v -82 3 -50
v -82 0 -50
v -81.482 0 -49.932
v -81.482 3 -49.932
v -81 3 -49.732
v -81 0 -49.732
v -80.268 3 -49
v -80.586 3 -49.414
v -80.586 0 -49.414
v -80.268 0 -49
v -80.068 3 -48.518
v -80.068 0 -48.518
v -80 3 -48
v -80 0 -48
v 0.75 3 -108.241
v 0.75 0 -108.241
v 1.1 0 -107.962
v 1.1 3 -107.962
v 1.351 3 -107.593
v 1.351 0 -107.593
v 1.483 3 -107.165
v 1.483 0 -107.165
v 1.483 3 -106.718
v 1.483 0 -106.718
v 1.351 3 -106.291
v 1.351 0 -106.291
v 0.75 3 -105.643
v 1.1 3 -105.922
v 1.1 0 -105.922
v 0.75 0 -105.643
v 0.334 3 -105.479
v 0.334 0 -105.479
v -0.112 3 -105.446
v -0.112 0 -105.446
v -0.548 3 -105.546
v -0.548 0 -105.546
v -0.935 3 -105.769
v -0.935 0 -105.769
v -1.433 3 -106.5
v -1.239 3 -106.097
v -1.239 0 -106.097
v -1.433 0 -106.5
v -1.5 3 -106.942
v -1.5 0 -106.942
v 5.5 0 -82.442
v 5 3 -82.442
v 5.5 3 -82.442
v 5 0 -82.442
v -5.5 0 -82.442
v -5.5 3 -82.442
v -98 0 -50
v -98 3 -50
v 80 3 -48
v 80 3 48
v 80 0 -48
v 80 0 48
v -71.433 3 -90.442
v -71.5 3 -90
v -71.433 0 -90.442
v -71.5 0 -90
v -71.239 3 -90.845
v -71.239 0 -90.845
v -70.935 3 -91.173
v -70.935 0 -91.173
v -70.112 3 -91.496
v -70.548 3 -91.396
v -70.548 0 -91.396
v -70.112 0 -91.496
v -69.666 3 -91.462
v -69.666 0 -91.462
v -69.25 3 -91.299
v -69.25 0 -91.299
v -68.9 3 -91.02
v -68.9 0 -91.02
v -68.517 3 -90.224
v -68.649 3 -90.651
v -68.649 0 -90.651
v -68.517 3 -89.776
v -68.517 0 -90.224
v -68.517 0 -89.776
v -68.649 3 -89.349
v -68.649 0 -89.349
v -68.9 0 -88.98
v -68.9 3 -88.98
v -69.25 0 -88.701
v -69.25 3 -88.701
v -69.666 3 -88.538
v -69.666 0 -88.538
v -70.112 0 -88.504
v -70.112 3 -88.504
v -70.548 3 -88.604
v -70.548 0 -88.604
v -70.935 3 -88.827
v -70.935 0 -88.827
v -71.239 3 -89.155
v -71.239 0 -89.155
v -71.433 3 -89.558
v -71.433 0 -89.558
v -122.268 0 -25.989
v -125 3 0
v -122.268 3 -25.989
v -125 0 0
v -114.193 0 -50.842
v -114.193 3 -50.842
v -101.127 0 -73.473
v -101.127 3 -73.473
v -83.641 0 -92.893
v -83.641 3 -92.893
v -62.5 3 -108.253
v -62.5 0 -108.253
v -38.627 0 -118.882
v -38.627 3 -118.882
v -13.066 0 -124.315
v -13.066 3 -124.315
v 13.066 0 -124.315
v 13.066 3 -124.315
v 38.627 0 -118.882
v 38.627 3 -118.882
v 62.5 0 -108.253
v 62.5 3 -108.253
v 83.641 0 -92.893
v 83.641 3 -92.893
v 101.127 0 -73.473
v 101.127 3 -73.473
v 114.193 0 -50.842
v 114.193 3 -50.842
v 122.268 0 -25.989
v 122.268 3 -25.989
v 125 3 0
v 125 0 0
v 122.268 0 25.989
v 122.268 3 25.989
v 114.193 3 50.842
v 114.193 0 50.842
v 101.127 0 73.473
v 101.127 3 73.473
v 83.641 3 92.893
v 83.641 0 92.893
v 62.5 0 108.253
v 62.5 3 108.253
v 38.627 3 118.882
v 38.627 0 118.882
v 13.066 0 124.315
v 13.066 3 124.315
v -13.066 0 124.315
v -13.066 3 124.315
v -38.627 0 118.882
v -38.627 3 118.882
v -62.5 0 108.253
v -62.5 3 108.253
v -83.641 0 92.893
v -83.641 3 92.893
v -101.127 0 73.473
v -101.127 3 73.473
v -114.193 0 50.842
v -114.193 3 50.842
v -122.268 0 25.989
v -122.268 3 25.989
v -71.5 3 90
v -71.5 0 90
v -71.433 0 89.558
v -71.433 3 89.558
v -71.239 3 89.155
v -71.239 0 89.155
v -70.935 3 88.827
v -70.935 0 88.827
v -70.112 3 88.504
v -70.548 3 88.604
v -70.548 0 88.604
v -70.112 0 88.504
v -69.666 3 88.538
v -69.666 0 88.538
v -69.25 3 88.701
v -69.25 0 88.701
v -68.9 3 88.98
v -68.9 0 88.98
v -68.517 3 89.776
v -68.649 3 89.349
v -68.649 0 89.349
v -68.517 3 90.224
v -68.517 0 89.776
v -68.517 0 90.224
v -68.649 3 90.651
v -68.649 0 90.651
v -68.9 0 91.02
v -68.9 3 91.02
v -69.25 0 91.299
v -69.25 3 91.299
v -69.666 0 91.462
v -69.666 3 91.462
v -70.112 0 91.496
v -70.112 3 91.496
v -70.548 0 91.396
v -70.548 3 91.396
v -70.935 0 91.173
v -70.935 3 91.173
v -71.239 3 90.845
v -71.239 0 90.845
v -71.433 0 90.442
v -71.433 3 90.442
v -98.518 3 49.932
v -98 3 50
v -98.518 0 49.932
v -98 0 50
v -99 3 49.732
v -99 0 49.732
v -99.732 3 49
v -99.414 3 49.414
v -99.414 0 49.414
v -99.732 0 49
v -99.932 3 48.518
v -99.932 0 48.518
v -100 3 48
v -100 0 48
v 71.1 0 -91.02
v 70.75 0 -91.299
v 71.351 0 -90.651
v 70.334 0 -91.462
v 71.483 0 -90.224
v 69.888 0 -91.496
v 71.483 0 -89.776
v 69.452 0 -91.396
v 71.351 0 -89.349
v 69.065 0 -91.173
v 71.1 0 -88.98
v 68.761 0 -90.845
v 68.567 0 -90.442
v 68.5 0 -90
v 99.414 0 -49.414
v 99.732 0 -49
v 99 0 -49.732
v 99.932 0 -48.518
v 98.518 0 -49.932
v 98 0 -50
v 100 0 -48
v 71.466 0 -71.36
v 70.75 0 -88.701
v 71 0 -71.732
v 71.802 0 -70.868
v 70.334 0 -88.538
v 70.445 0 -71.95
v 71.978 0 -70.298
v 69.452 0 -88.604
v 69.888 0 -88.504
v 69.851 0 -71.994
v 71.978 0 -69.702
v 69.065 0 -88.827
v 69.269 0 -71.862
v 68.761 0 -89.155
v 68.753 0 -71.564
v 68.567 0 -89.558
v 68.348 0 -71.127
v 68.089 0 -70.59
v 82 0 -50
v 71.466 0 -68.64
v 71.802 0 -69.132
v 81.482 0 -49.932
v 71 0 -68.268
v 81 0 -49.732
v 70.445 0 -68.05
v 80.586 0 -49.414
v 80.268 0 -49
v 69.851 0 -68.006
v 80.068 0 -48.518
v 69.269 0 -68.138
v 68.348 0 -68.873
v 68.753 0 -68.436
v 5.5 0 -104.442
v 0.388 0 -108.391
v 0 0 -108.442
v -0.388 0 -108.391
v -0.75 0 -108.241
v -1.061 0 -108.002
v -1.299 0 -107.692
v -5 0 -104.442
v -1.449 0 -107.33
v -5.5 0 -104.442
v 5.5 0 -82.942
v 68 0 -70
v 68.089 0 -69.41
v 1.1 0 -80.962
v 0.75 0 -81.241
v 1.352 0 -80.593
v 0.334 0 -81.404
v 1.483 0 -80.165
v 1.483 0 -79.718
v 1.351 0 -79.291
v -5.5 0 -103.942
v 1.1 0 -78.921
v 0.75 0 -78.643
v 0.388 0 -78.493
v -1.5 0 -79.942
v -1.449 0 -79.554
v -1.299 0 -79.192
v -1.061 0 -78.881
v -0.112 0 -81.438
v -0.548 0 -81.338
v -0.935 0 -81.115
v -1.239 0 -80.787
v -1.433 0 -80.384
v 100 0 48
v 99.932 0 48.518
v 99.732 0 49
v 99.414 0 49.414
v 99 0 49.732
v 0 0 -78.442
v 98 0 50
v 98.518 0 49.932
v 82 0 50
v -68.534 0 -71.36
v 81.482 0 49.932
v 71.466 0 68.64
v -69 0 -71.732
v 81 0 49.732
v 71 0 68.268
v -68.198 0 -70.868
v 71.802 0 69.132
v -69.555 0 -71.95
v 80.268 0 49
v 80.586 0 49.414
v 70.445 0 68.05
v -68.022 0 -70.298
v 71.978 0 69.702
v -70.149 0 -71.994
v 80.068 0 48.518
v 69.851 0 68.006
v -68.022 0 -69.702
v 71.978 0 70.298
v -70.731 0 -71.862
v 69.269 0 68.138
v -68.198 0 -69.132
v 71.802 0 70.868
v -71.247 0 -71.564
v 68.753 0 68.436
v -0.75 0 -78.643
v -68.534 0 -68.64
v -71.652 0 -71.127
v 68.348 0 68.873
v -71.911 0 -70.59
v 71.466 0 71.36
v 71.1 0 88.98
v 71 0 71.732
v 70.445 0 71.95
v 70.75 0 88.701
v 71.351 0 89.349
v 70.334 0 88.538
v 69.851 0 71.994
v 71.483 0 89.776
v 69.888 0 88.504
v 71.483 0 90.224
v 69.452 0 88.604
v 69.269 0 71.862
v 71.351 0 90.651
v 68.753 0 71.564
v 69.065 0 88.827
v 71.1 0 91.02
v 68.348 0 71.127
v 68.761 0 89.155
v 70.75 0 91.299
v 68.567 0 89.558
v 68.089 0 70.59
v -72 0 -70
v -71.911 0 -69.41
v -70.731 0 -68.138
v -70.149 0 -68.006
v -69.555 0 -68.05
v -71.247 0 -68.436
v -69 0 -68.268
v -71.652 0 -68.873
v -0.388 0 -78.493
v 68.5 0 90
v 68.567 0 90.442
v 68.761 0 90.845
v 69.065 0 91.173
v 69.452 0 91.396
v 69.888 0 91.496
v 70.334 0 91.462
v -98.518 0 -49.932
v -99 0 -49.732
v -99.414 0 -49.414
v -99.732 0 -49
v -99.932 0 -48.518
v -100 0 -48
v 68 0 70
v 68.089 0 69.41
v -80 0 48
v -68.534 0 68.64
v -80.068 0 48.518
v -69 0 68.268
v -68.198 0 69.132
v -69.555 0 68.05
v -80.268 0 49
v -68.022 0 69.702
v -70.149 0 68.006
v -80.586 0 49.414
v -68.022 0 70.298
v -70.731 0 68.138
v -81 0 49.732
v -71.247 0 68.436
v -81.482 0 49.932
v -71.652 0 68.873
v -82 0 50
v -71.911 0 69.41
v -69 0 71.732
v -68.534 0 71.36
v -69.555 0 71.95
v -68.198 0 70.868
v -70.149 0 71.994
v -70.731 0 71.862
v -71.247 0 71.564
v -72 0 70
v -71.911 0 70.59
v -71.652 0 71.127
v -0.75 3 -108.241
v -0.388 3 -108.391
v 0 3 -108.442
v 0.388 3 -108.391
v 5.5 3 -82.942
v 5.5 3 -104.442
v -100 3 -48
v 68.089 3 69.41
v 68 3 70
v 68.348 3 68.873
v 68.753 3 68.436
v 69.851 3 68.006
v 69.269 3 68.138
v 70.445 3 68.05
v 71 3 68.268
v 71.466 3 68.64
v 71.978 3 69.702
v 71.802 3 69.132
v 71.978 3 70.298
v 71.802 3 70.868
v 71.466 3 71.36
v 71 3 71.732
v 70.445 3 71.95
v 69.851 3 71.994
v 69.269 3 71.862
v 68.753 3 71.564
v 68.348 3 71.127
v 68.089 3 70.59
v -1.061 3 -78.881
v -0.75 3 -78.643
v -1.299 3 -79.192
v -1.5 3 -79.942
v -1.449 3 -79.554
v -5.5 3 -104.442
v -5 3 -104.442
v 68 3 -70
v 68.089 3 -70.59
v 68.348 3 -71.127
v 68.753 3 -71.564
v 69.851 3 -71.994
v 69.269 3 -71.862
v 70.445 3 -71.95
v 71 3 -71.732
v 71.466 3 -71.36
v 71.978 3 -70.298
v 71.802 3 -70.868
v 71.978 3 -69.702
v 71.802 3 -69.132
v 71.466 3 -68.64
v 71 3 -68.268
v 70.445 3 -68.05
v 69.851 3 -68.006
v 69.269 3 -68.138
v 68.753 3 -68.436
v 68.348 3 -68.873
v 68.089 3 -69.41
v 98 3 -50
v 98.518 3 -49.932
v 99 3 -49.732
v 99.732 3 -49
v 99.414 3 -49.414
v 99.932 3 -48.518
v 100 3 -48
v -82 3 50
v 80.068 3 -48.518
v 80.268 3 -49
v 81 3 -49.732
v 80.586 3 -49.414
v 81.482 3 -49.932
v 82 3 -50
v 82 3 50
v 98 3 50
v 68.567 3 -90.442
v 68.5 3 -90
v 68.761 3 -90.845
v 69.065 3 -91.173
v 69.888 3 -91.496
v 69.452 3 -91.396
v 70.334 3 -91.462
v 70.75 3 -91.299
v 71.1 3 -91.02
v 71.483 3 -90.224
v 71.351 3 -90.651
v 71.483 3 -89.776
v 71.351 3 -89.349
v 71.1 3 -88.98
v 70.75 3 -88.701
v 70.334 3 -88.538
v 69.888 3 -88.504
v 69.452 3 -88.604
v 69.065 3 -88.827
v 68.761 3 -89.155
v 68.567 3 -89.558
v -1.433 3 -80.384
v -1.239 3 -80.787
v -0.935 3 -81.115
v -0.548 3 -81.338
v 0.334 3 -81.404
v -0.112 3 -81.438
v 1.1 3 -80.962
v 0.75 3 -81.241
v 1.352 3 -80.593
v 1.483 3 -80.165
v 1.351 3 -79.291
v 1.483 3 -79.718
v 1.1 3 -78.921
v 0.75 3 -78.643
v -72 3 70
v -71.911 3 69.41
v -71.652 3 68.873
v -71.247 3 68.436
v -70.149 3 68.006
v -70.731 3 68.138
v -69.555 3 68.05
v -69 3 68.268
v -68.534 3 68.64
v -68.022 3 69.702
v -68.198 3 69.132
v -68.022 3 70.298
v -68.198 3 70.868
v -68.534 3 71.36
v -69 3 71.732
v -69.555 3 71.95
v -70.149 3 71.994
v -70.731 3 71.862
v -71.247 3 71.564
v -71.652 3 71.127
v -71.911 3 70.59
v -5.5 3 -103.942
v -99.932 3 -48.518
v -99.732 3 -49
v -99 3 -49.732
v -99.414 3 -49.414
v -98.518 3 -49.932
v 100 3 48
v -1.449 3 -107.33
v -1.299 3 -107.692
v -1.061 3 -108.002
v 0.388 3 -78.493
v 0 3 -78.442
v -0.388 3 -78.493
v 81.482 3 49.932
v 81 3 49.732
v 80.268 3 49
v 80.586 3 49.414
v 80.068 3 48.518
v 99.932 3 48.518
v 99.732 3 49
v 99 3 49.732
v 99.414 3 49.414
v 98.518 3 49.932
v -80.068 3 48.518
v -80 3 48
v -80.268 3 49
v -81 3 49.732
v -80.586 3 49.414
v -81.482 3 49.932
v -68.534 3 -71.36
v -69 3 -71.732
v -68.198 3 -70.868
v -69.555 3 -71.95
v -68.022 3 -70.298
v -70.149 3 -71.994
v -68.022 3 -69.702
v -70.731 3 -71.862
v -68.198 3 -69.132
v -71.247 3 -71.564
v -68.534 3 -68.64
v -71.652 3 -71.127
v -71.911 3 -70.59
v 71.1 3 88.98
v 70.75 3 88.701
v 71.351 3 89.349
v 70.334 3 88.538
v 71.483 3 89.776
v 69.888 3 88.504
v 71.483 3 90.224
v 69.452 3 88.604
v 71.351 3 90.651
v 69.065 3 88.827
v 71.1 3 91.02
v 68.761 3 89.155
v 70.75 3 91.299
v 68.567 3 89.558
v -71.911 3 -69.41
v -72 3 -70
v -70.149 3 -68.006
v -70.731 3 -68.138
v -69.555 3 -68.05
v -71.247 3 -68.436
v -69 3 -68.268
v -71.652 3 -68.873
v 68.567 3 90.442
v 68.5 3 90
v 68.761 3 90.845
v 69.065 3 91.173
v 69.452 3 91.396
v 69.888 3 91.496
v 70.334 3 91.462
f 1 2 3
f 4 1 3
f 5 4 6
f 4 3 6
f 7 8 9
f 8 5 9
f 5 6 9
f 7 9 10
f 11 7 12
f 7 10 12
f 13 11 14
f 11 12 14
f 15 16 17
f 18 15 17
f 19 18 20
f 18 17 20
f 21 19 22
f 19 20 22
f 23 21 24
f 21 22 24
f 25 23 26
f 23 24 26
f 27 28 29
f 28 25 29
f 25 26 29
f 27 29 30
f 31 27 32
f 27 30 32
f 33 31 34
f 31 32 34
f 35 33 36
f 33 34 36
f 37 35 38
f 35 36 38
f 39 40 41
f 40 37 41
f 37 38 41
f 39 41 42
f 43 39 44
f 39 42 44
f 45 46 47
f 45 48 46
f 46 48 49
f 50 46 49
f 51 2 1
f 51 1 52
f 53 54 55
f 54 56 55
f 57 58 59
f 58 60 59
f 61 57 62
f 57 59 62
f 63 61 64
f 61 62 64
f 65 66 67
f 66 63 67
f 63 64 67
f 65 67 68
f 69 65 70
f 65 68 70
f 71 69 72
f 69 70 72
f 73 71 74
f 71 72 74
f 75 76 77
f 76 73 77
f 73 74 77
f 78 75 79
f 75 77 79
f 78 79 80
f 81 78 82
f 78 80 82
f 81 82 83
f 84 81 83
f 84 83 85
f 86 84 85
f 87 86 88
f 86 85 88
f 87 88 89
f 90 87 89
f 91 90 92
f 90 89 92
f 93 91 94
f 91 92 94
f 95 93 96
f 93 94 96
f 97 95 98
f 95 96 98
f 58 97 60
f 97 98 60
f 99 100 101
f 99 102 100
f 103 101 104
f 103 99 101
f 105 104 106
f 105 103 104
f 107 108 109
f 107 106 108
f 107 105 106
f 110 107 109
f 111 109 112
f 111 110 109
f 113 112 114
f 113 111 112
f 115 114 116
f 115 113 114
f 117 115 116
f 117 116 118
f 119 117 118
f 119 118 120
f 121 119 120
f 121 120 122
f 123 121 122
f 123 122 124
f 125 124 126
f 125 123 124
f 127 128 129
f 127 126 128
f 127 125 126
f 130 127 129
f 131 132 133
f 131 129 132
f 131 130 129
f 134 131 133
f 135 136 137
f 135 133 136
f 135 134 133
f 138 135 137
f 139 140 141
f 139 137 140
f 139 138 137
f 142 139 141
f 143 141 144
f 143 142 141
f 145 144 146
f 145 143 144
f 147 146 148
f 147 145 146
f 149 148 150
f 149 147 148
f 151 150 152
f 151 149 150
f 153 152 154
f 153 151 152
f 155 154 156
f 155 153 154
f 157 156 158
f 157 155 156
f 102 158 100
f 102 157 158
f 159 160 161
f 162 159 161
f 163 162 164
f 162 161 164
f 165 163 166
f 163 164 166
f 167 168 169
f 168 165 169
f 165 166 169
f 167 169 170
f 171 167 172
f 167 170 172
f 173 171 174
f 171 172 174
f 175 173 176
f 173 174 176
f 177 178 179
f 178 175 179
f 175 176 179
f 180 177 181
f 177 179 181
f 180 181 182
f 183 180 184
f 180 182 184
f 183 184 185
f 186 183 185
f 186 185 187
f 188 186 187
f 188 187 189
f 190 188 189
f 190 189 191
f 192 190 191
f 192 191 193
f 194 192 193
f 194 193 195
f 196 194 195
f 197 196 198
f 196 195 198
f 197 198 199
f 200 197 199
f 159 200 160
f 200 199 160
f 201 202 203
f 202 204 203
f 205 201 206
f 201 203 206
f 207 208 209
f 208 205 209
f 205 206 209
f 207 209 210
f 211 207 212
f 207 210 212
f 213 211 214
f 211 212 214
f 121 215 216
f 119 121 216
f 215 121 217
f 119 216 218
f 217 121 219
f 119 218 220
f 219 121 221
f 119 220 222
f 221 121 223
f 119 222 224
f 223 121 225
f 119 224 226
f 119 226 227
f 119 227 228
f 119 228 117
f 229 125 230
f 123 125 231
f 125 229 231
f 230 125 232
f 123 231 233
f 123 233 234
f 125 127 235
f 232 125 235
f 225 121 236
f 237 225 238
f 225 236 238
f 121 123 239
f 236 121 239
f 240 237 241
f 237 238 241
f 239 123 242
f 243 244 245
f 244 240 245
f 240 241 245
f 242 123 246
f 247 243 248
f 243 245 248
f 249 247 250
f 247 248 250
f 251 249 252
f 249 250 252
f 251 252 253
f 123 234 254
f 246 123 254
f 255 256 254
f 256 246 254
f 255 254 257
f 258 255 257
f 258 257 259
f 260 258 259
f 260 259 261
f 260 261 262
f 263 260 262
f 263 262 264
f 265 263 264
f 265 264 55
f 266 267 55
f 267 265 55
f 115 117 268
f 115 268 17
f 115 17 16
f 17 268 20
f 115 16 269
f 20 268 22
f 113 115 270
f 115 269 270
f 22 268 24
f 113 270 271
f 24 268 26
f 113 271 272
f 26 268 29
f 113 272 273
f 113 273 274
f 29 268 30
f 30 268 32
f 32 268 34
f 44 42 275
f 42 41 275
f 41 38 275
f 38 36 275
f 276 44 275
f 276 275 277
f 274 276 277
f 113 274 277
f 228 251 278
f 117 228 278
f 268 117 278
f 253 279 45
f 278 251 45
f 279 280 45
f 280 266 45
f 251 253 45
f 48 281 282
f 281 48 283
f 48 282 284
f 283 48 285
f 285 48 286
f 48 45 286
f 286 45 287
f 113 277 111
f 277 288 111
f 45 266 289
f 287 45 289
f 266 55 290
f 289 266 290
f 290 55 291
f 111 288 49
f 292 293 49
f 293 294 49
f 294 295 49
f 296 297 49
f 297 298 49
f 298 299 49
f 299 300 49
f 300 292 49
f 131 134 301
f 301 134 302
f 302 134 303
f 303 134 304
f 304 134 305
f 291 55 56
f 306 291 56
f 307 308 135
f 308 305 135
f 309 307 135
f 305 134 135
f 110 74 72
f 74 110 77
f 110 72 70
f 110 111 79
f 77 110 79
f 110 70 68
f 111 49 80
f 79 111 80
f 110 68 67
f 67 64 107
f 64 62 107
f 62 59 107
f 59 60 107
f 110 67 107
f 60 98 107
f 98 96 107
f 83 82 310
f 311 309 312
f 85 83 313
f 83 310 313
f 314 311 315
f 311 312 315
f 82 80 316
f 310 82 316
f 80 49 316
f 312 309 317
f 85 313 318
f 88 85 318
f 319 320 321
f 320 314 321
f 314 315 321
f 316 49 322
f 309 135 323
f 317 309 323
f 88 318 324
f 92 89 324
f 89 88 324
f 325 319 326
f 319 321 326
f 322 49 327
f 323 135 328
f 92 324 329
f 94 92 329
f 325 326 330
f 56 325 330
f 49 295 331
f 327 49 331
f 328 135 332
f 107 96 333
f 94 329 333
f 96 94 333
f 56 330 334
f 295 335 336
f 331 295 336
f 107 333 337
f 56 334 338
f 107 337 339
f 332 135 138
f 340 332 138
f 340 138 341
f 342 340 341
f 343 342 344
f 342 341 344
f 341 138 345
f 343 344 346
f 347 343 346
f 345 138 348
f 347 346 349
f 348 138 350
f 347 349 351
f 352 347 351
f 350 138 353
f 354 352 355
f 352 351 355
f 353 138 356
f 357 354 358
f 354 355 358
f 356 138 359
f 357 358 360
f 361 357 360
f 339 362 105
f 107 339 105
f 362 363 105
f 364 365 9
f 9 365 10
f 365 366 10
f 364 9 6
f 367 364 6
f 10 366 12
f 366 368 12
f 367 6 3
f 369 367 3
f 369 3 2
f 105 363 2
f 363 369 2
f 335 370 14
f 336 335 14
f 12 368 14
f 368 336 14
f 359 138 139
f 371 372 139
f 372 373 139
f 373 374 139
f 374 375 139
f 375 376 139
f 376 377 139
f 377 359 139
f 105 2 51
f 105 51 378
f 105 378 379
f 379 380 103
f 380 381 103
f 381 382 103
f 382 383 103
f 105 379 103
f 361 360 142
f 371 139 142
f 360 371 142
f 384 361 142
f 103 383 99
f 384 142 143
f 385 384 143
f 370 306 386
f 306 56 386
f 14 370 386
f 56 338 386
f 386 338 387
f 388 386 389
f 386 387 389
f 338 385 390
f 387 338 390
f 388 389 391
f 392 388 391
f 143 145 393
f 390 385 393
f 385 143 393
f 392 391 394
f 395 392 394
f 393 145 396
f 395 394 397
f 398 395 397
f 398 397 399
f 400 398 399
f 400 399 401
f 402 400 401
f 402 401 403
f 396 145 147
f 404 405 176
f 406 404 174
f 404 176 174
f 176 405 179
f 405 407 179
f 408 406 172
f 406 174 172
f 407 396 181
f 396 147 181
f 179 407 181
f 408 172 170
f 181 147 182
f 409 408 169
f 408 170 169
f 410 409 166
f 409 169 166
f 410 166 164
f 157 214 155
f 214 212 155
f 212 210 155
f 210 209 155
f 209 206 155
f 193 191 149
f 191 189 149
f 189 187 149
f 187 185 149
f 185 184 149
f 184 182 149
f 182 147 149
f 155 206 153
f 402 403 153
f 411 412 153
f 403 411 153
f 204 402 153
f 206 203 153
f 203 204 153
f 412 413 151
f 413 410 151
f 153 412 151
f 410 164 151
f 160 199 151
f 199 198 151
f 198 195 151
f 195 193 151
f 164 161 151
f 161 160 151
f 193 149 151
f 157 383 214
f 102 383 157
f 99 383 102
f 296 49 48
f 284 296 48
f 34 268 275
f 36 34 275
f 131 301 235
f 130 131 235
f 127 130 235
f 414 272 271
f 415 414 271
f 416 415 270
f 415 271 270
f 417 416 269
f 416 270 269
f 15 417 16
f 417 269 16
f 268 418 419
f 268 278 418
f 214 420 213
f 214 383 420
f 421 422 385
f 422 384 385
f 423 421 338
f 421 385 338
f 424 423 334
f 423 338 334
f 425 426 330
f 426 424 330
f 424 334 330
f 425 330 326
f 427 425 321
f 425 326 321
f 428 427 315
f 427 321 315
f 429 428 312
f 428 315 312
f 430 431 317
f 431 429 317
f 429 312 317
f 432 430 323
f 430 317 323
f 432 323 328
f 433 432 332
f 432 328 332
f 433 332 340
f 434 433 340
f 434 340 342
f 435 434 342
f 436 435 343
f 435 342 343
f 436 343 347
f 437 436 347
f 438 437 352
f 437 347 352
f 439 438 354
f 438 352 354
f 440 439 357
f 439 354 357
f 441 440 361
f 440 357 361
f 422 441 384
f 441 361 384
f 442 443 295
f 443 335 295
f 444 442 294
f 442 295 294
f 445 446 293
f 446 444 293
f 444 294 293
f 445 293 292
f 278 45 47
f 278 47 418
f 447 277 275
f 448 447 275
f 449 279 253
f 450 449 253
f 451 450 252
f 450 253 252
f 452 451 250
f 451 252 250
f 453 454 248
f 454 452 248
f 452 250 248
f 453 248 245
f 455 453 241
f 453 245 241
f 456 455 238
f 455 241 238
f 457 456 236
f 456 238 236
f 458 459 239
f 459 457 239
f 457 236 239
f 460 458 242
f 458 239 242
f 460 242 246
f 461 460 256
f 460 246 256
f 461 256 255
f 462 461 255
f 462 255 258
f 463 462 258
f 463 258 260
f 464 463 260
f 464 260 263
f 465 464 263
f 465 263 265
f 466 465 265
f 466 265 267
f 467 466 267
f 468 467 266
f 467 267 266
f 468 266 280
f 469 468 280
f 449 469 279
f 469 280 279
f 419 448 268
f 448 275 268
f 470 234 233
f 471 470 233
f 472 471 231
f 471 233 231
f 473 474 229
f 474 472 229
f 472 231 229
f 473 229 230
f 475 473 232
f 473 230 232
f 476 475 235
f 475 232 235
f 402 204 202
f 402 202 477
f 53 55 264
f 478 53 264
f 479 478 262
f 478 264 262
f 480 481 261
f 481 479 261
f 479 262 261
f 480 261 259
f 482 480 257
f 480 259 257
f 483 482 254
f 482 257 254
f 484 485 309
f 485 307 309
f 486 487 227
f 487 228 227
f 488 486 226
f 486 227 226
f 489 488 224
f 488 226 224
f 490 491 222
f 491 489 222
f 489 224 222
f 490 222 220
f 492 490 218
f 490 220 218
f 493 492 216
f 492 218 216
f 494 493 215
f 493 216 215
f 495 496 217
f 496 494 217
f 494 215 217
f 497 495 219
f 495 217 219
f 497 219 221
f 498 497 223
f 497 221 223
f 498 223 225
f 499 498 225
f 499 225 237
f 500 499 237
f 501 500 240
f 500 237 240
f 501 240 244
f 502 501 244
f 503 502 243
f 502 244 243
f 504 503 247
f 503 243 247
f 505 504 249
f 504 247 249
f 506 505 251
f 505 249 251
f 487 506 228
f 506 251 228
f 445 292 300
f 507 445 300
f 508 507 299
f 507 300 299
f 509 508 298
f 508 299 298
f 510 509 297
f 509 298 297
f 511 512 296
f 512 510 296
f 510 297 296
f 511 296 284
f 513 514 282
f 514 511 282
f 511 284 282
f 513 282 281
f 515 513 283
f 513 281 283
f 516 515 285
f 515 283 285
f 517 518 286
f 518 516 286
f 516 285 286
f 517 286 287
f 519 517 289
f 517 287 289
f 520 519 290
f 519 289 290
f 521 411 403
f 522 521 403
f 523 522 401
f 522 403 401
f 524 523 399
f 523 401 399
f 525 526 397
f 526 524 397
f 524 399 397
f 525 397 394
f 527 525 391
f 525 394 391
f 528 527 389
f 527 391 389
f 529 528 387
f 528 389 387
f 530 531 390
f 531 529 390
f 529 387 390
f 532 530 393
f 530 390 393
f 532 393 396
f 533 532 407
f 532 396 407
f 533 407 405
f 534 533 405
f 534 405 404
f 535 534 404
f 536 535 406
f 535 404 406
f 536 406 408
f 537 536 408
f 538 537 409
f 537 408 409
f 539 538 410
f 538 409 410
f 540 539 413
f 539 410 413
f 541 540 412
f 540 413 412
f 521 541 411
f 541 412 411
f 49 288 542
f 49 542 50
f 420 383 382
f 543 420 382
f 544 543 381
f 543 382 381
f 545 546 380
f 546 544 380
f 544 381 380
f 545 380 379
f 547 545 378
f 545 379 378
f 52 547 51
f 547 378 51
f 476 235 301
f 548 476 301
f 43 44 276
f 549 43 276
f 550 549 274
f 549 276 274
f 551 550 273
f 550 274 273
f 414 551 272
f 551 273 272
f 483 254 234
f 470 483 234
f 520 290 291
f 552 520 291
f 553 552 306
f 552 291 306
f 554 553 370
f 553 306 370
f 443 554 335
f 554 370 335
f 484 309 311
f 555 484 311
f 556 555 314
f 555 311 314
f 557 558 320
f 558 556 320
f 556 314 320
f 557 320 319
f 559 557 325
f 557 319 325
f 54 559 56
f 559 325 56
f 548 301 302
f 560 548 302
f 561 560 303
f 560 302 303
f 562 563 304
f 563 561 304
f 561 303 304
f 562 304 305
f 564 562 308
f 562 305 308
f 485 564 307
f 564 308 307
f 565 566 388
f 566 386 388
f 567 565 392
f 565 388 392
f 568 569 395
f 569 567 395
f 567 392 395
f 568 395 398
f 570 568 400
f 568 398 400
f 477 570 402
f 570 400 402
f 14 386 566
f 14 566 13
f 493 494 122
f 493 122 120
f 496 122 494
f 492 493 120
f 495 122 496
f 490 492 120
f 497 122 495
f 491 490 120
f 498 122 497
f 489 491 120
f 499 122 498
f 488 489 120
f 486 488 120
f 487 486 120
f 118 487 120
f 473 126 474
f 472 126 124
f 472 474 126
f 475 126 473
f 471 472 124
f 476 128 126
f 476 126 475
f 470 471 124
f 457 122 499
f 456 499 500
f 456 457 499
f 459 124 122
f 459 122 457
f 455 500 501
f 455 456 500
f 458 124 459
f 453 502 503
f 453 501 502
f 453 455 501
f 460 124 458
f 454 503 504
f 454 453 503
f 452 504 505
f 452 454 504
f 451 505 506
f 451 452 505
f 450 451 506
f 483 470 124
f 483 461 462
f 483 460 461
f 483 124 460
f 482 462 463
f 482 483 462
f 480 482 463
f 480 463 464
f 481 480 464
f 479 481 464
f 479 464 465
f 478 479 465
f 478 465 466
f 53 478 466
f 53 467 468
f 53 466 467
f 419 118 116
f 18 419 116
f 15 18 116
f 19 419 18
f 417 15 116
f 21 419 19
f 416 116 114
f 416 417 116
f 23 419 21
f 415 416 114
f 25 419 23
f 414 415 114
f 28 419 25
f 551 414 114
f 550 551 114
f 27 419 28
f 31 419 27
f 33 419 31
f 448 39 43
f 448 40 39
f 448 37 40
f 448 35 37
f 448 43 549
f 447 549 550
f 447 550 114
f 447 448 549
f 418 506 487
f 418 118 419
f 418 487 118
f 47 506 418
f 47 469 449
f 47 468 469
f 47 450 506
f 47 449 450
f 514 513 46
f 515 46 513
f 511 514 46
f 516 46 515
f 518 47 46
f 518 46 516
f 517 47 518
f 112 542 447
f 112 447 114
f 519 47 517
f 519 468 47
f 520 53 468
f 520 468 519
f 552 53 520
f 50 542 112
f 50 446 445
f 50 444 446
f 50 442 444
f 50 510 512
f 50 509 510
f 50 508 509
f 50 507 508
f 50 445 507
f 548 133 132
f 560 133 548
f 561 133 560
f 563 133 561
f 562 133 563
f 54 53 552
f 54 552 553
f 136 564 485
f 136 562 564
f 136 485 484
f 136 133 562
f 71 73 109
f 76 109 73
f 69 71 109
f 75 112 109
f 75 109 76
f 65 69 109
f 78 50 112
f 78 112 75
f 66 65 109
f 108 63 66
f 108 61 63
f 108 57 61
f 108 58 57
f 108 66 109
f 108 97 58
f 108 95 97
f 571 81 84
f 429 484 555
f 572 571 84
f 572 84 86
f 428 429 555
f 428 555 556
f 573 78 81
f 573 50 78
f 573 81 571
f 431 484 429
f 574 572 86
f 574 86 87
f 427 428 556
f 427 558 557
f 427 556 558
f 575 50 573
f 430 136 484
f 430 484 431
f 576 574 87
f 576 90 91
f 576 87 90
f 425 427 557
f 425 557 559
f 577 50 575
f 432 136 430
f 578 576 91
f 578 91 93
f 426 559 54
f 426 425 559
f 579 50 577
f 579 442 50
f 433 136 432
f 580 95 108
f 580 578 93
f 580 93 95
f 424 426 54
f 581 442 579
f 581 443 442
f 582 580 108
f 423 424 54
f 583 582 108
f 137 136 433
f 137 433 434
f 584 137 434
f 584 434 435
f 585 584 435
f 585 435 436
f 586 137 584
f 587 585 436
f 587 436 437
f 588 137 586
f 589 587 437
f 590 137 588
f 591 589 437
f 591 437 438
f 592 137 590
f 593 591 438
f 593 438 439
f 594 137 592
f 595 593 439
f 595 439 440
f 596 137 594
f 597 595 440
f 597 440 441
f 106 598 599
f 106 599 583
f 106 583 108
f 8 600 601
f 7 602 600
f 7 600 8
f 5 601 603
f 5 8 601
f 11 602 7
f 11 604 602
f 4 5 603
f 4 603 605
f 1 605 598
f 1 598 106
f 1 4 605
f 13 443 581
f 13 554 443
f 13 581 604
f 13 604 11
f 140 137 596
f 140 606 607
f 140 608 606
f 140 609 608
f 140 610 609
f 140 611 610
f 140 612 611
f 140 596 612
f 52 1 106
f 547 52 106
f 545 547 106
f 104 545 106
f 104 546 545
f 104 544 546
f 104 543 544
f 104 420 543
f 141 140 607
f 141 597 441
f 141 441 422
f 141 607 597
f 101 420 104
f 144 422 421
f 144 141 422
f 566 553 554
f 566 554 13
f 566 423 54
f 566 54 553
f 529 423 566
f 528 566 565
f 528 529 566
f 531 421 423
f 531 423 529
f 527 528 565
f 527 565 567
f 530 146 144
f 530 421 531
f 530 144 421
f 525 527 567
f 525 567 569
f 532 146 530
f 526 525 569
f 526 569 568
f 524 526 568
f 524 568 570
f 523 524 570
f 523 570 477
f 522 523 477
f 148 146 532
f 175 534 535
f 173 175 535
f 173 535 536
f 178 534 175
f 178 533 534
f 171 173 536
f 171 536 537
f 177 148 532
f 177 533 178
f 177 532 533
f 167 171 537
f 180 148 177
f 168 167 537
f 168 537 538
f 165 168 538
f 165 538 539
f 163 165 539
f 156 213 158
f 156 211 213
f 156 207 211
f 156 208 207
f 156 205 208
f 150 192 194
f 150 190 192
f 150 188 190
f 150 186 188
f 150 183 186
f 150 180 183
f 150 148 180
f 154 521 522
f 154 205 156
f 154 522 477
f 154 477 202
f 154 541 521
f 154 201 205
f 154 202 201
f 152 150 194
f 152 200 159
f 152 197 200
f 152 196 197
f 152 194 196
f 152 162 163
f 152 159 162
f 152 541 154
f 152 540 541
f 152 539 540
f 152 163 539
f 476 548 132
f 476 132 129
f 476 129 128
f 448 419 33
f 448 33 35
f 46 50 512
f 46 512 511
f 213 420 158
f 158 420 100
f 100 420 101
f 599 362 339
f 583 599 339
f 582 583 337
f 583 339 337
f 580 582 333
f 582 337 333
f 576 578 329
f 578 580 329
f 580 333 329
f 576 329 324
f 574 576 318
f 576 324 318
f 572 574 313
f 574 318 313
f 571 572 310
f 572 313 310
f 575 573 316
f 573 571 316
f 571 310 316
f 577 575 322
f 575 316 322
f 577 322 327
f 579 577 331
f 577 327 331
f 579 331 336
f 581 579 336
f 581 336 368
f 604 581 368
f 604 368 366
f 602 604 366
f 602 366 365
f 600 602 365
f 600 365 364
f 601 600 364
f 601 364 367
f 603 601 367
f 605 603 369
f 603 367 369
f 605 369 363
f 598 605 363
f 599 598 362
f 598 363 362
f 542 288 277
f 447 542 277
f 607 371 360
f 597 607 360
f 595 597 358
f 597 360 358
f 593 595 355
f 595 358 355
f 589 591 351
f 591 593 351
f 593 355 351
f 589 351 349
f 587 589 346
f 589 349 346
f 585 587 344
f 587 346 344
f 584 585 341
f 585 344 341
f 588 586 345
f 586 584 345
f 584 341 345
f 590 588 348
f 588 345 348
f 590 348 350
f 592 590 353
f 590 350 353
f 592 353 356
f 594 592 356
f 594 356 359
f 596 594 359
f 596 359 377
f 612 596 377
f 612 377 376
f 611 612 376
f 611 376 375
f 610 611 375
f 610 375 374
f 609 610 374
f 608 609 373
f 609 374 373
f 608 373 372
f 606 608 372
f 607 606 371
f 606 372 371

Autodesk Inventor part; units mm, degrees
ref_plane "YZ Plane" through (0, 0, 0) normal (1, 0, 0) x (0, 1, 0)
ref_plane "XZ Plane" through (0, 0, 0) normal (0, 1, 0) x (-1, 0, 0)
ref_plane "XY Plane" through (0, 0, 0) normal (0, 0, 1) x (1, 0, 0)
sketch "Sketch1" plane through (0, 0, 0) normal (0, 1, 0) x (-1, 0, 0)
  circle A0 centre (0, 0) radius 125
  circle A1 centre (70, -90) radius 1.5
  circle A2 centre (-70, -90) radius 1.5
  circle A3 centre (-70, 90) radius 1.5
  circle A4 centre (70, 90) radius 1.5
  circle A5 centre (70, -70) radius 2
  circle A6 centre (-70, -70) radius 2
  circle A7 centre (-70, 70) radius 2
  circle A8 centre (70, 70) radius 2
  line L0 (5, -104.4418) -> (-5.5, -104.4418)
  line L1 (-5.5, -82.9418) -> (-5.5, -104.4418)
  line L2 (-5, -82.4418) -> (5.5, -82.4418)
  line L3 (5.5, -103.9418) -> (5.5, -82.4418)
  line L4 (-5, -82.4418) -> (-5.5, -82.4418)
  line L5 (-5.5, -82.4418) -> (-5.5, -82.9418)
  line L6 (5.5, -103.9418) -> (5.5, -104.4418)
  line L7 (5.5, -104.4418) -> (5, -104.4418)
  arc A9 (0.75, -108.2408) -> (-0.75, -108.2408) centre (0, -106.9418) ccw
  arc A10 (-0.75, -78.6427) -> (0.75, -78.6427) centre (0, -79.9418) ccw
  circle A11 centre (0, -106.9418) radius 1.5
  circle A12 centre (0, -79.9418) radius 1.5
  line L8 (98, 50) -> (82, 50)
  line L9 (80, 48) -> (80, -48)
  line L10 (82, -50) -> (98, -50)
  line L11 (100, -48) -> (100, 48)
  line L12 (-98, 50) -> (-82, 50)
  line L13 (-80, 48) -> (-80, -48)
  line L14 (-82, -50) -> (-98, -50)
  line L15 (-100, -48) -> (-100, 48)
  arc A13 (98, -50) -> (100, -48) centre (98, -48) ccw
  arc A14 (100, 48) -> (98, 50) centre (98, 48) ccw
  arc A15 (82, 50) -> (80, 48) centre (82, 48) ccw
  arc A16 (80, -48) -> (82, -50) centre (82, -48) ccw
  arc A17 (-82, -50) -> (-80, -48) centre (-82, -48) ccw
  arc A18 (-80, 48) -> (-82, 50) centre (-82, 48) ccw
  arc A19 (-98, 50) -> (-100, 48) centre (-98, 48) ccw
  arc A20 (-100, -48) -> (-98, -50) centre (-98, -48) ccw
  point P0 (0.75, -108.2408)
  point P1 (-0.75, -78.6427)
  point P2 (0.75, -78.6427)
  point P3 (-90, 0)
extrude "Extrusion6" add sketch "Sketch1" along normal blind 3
